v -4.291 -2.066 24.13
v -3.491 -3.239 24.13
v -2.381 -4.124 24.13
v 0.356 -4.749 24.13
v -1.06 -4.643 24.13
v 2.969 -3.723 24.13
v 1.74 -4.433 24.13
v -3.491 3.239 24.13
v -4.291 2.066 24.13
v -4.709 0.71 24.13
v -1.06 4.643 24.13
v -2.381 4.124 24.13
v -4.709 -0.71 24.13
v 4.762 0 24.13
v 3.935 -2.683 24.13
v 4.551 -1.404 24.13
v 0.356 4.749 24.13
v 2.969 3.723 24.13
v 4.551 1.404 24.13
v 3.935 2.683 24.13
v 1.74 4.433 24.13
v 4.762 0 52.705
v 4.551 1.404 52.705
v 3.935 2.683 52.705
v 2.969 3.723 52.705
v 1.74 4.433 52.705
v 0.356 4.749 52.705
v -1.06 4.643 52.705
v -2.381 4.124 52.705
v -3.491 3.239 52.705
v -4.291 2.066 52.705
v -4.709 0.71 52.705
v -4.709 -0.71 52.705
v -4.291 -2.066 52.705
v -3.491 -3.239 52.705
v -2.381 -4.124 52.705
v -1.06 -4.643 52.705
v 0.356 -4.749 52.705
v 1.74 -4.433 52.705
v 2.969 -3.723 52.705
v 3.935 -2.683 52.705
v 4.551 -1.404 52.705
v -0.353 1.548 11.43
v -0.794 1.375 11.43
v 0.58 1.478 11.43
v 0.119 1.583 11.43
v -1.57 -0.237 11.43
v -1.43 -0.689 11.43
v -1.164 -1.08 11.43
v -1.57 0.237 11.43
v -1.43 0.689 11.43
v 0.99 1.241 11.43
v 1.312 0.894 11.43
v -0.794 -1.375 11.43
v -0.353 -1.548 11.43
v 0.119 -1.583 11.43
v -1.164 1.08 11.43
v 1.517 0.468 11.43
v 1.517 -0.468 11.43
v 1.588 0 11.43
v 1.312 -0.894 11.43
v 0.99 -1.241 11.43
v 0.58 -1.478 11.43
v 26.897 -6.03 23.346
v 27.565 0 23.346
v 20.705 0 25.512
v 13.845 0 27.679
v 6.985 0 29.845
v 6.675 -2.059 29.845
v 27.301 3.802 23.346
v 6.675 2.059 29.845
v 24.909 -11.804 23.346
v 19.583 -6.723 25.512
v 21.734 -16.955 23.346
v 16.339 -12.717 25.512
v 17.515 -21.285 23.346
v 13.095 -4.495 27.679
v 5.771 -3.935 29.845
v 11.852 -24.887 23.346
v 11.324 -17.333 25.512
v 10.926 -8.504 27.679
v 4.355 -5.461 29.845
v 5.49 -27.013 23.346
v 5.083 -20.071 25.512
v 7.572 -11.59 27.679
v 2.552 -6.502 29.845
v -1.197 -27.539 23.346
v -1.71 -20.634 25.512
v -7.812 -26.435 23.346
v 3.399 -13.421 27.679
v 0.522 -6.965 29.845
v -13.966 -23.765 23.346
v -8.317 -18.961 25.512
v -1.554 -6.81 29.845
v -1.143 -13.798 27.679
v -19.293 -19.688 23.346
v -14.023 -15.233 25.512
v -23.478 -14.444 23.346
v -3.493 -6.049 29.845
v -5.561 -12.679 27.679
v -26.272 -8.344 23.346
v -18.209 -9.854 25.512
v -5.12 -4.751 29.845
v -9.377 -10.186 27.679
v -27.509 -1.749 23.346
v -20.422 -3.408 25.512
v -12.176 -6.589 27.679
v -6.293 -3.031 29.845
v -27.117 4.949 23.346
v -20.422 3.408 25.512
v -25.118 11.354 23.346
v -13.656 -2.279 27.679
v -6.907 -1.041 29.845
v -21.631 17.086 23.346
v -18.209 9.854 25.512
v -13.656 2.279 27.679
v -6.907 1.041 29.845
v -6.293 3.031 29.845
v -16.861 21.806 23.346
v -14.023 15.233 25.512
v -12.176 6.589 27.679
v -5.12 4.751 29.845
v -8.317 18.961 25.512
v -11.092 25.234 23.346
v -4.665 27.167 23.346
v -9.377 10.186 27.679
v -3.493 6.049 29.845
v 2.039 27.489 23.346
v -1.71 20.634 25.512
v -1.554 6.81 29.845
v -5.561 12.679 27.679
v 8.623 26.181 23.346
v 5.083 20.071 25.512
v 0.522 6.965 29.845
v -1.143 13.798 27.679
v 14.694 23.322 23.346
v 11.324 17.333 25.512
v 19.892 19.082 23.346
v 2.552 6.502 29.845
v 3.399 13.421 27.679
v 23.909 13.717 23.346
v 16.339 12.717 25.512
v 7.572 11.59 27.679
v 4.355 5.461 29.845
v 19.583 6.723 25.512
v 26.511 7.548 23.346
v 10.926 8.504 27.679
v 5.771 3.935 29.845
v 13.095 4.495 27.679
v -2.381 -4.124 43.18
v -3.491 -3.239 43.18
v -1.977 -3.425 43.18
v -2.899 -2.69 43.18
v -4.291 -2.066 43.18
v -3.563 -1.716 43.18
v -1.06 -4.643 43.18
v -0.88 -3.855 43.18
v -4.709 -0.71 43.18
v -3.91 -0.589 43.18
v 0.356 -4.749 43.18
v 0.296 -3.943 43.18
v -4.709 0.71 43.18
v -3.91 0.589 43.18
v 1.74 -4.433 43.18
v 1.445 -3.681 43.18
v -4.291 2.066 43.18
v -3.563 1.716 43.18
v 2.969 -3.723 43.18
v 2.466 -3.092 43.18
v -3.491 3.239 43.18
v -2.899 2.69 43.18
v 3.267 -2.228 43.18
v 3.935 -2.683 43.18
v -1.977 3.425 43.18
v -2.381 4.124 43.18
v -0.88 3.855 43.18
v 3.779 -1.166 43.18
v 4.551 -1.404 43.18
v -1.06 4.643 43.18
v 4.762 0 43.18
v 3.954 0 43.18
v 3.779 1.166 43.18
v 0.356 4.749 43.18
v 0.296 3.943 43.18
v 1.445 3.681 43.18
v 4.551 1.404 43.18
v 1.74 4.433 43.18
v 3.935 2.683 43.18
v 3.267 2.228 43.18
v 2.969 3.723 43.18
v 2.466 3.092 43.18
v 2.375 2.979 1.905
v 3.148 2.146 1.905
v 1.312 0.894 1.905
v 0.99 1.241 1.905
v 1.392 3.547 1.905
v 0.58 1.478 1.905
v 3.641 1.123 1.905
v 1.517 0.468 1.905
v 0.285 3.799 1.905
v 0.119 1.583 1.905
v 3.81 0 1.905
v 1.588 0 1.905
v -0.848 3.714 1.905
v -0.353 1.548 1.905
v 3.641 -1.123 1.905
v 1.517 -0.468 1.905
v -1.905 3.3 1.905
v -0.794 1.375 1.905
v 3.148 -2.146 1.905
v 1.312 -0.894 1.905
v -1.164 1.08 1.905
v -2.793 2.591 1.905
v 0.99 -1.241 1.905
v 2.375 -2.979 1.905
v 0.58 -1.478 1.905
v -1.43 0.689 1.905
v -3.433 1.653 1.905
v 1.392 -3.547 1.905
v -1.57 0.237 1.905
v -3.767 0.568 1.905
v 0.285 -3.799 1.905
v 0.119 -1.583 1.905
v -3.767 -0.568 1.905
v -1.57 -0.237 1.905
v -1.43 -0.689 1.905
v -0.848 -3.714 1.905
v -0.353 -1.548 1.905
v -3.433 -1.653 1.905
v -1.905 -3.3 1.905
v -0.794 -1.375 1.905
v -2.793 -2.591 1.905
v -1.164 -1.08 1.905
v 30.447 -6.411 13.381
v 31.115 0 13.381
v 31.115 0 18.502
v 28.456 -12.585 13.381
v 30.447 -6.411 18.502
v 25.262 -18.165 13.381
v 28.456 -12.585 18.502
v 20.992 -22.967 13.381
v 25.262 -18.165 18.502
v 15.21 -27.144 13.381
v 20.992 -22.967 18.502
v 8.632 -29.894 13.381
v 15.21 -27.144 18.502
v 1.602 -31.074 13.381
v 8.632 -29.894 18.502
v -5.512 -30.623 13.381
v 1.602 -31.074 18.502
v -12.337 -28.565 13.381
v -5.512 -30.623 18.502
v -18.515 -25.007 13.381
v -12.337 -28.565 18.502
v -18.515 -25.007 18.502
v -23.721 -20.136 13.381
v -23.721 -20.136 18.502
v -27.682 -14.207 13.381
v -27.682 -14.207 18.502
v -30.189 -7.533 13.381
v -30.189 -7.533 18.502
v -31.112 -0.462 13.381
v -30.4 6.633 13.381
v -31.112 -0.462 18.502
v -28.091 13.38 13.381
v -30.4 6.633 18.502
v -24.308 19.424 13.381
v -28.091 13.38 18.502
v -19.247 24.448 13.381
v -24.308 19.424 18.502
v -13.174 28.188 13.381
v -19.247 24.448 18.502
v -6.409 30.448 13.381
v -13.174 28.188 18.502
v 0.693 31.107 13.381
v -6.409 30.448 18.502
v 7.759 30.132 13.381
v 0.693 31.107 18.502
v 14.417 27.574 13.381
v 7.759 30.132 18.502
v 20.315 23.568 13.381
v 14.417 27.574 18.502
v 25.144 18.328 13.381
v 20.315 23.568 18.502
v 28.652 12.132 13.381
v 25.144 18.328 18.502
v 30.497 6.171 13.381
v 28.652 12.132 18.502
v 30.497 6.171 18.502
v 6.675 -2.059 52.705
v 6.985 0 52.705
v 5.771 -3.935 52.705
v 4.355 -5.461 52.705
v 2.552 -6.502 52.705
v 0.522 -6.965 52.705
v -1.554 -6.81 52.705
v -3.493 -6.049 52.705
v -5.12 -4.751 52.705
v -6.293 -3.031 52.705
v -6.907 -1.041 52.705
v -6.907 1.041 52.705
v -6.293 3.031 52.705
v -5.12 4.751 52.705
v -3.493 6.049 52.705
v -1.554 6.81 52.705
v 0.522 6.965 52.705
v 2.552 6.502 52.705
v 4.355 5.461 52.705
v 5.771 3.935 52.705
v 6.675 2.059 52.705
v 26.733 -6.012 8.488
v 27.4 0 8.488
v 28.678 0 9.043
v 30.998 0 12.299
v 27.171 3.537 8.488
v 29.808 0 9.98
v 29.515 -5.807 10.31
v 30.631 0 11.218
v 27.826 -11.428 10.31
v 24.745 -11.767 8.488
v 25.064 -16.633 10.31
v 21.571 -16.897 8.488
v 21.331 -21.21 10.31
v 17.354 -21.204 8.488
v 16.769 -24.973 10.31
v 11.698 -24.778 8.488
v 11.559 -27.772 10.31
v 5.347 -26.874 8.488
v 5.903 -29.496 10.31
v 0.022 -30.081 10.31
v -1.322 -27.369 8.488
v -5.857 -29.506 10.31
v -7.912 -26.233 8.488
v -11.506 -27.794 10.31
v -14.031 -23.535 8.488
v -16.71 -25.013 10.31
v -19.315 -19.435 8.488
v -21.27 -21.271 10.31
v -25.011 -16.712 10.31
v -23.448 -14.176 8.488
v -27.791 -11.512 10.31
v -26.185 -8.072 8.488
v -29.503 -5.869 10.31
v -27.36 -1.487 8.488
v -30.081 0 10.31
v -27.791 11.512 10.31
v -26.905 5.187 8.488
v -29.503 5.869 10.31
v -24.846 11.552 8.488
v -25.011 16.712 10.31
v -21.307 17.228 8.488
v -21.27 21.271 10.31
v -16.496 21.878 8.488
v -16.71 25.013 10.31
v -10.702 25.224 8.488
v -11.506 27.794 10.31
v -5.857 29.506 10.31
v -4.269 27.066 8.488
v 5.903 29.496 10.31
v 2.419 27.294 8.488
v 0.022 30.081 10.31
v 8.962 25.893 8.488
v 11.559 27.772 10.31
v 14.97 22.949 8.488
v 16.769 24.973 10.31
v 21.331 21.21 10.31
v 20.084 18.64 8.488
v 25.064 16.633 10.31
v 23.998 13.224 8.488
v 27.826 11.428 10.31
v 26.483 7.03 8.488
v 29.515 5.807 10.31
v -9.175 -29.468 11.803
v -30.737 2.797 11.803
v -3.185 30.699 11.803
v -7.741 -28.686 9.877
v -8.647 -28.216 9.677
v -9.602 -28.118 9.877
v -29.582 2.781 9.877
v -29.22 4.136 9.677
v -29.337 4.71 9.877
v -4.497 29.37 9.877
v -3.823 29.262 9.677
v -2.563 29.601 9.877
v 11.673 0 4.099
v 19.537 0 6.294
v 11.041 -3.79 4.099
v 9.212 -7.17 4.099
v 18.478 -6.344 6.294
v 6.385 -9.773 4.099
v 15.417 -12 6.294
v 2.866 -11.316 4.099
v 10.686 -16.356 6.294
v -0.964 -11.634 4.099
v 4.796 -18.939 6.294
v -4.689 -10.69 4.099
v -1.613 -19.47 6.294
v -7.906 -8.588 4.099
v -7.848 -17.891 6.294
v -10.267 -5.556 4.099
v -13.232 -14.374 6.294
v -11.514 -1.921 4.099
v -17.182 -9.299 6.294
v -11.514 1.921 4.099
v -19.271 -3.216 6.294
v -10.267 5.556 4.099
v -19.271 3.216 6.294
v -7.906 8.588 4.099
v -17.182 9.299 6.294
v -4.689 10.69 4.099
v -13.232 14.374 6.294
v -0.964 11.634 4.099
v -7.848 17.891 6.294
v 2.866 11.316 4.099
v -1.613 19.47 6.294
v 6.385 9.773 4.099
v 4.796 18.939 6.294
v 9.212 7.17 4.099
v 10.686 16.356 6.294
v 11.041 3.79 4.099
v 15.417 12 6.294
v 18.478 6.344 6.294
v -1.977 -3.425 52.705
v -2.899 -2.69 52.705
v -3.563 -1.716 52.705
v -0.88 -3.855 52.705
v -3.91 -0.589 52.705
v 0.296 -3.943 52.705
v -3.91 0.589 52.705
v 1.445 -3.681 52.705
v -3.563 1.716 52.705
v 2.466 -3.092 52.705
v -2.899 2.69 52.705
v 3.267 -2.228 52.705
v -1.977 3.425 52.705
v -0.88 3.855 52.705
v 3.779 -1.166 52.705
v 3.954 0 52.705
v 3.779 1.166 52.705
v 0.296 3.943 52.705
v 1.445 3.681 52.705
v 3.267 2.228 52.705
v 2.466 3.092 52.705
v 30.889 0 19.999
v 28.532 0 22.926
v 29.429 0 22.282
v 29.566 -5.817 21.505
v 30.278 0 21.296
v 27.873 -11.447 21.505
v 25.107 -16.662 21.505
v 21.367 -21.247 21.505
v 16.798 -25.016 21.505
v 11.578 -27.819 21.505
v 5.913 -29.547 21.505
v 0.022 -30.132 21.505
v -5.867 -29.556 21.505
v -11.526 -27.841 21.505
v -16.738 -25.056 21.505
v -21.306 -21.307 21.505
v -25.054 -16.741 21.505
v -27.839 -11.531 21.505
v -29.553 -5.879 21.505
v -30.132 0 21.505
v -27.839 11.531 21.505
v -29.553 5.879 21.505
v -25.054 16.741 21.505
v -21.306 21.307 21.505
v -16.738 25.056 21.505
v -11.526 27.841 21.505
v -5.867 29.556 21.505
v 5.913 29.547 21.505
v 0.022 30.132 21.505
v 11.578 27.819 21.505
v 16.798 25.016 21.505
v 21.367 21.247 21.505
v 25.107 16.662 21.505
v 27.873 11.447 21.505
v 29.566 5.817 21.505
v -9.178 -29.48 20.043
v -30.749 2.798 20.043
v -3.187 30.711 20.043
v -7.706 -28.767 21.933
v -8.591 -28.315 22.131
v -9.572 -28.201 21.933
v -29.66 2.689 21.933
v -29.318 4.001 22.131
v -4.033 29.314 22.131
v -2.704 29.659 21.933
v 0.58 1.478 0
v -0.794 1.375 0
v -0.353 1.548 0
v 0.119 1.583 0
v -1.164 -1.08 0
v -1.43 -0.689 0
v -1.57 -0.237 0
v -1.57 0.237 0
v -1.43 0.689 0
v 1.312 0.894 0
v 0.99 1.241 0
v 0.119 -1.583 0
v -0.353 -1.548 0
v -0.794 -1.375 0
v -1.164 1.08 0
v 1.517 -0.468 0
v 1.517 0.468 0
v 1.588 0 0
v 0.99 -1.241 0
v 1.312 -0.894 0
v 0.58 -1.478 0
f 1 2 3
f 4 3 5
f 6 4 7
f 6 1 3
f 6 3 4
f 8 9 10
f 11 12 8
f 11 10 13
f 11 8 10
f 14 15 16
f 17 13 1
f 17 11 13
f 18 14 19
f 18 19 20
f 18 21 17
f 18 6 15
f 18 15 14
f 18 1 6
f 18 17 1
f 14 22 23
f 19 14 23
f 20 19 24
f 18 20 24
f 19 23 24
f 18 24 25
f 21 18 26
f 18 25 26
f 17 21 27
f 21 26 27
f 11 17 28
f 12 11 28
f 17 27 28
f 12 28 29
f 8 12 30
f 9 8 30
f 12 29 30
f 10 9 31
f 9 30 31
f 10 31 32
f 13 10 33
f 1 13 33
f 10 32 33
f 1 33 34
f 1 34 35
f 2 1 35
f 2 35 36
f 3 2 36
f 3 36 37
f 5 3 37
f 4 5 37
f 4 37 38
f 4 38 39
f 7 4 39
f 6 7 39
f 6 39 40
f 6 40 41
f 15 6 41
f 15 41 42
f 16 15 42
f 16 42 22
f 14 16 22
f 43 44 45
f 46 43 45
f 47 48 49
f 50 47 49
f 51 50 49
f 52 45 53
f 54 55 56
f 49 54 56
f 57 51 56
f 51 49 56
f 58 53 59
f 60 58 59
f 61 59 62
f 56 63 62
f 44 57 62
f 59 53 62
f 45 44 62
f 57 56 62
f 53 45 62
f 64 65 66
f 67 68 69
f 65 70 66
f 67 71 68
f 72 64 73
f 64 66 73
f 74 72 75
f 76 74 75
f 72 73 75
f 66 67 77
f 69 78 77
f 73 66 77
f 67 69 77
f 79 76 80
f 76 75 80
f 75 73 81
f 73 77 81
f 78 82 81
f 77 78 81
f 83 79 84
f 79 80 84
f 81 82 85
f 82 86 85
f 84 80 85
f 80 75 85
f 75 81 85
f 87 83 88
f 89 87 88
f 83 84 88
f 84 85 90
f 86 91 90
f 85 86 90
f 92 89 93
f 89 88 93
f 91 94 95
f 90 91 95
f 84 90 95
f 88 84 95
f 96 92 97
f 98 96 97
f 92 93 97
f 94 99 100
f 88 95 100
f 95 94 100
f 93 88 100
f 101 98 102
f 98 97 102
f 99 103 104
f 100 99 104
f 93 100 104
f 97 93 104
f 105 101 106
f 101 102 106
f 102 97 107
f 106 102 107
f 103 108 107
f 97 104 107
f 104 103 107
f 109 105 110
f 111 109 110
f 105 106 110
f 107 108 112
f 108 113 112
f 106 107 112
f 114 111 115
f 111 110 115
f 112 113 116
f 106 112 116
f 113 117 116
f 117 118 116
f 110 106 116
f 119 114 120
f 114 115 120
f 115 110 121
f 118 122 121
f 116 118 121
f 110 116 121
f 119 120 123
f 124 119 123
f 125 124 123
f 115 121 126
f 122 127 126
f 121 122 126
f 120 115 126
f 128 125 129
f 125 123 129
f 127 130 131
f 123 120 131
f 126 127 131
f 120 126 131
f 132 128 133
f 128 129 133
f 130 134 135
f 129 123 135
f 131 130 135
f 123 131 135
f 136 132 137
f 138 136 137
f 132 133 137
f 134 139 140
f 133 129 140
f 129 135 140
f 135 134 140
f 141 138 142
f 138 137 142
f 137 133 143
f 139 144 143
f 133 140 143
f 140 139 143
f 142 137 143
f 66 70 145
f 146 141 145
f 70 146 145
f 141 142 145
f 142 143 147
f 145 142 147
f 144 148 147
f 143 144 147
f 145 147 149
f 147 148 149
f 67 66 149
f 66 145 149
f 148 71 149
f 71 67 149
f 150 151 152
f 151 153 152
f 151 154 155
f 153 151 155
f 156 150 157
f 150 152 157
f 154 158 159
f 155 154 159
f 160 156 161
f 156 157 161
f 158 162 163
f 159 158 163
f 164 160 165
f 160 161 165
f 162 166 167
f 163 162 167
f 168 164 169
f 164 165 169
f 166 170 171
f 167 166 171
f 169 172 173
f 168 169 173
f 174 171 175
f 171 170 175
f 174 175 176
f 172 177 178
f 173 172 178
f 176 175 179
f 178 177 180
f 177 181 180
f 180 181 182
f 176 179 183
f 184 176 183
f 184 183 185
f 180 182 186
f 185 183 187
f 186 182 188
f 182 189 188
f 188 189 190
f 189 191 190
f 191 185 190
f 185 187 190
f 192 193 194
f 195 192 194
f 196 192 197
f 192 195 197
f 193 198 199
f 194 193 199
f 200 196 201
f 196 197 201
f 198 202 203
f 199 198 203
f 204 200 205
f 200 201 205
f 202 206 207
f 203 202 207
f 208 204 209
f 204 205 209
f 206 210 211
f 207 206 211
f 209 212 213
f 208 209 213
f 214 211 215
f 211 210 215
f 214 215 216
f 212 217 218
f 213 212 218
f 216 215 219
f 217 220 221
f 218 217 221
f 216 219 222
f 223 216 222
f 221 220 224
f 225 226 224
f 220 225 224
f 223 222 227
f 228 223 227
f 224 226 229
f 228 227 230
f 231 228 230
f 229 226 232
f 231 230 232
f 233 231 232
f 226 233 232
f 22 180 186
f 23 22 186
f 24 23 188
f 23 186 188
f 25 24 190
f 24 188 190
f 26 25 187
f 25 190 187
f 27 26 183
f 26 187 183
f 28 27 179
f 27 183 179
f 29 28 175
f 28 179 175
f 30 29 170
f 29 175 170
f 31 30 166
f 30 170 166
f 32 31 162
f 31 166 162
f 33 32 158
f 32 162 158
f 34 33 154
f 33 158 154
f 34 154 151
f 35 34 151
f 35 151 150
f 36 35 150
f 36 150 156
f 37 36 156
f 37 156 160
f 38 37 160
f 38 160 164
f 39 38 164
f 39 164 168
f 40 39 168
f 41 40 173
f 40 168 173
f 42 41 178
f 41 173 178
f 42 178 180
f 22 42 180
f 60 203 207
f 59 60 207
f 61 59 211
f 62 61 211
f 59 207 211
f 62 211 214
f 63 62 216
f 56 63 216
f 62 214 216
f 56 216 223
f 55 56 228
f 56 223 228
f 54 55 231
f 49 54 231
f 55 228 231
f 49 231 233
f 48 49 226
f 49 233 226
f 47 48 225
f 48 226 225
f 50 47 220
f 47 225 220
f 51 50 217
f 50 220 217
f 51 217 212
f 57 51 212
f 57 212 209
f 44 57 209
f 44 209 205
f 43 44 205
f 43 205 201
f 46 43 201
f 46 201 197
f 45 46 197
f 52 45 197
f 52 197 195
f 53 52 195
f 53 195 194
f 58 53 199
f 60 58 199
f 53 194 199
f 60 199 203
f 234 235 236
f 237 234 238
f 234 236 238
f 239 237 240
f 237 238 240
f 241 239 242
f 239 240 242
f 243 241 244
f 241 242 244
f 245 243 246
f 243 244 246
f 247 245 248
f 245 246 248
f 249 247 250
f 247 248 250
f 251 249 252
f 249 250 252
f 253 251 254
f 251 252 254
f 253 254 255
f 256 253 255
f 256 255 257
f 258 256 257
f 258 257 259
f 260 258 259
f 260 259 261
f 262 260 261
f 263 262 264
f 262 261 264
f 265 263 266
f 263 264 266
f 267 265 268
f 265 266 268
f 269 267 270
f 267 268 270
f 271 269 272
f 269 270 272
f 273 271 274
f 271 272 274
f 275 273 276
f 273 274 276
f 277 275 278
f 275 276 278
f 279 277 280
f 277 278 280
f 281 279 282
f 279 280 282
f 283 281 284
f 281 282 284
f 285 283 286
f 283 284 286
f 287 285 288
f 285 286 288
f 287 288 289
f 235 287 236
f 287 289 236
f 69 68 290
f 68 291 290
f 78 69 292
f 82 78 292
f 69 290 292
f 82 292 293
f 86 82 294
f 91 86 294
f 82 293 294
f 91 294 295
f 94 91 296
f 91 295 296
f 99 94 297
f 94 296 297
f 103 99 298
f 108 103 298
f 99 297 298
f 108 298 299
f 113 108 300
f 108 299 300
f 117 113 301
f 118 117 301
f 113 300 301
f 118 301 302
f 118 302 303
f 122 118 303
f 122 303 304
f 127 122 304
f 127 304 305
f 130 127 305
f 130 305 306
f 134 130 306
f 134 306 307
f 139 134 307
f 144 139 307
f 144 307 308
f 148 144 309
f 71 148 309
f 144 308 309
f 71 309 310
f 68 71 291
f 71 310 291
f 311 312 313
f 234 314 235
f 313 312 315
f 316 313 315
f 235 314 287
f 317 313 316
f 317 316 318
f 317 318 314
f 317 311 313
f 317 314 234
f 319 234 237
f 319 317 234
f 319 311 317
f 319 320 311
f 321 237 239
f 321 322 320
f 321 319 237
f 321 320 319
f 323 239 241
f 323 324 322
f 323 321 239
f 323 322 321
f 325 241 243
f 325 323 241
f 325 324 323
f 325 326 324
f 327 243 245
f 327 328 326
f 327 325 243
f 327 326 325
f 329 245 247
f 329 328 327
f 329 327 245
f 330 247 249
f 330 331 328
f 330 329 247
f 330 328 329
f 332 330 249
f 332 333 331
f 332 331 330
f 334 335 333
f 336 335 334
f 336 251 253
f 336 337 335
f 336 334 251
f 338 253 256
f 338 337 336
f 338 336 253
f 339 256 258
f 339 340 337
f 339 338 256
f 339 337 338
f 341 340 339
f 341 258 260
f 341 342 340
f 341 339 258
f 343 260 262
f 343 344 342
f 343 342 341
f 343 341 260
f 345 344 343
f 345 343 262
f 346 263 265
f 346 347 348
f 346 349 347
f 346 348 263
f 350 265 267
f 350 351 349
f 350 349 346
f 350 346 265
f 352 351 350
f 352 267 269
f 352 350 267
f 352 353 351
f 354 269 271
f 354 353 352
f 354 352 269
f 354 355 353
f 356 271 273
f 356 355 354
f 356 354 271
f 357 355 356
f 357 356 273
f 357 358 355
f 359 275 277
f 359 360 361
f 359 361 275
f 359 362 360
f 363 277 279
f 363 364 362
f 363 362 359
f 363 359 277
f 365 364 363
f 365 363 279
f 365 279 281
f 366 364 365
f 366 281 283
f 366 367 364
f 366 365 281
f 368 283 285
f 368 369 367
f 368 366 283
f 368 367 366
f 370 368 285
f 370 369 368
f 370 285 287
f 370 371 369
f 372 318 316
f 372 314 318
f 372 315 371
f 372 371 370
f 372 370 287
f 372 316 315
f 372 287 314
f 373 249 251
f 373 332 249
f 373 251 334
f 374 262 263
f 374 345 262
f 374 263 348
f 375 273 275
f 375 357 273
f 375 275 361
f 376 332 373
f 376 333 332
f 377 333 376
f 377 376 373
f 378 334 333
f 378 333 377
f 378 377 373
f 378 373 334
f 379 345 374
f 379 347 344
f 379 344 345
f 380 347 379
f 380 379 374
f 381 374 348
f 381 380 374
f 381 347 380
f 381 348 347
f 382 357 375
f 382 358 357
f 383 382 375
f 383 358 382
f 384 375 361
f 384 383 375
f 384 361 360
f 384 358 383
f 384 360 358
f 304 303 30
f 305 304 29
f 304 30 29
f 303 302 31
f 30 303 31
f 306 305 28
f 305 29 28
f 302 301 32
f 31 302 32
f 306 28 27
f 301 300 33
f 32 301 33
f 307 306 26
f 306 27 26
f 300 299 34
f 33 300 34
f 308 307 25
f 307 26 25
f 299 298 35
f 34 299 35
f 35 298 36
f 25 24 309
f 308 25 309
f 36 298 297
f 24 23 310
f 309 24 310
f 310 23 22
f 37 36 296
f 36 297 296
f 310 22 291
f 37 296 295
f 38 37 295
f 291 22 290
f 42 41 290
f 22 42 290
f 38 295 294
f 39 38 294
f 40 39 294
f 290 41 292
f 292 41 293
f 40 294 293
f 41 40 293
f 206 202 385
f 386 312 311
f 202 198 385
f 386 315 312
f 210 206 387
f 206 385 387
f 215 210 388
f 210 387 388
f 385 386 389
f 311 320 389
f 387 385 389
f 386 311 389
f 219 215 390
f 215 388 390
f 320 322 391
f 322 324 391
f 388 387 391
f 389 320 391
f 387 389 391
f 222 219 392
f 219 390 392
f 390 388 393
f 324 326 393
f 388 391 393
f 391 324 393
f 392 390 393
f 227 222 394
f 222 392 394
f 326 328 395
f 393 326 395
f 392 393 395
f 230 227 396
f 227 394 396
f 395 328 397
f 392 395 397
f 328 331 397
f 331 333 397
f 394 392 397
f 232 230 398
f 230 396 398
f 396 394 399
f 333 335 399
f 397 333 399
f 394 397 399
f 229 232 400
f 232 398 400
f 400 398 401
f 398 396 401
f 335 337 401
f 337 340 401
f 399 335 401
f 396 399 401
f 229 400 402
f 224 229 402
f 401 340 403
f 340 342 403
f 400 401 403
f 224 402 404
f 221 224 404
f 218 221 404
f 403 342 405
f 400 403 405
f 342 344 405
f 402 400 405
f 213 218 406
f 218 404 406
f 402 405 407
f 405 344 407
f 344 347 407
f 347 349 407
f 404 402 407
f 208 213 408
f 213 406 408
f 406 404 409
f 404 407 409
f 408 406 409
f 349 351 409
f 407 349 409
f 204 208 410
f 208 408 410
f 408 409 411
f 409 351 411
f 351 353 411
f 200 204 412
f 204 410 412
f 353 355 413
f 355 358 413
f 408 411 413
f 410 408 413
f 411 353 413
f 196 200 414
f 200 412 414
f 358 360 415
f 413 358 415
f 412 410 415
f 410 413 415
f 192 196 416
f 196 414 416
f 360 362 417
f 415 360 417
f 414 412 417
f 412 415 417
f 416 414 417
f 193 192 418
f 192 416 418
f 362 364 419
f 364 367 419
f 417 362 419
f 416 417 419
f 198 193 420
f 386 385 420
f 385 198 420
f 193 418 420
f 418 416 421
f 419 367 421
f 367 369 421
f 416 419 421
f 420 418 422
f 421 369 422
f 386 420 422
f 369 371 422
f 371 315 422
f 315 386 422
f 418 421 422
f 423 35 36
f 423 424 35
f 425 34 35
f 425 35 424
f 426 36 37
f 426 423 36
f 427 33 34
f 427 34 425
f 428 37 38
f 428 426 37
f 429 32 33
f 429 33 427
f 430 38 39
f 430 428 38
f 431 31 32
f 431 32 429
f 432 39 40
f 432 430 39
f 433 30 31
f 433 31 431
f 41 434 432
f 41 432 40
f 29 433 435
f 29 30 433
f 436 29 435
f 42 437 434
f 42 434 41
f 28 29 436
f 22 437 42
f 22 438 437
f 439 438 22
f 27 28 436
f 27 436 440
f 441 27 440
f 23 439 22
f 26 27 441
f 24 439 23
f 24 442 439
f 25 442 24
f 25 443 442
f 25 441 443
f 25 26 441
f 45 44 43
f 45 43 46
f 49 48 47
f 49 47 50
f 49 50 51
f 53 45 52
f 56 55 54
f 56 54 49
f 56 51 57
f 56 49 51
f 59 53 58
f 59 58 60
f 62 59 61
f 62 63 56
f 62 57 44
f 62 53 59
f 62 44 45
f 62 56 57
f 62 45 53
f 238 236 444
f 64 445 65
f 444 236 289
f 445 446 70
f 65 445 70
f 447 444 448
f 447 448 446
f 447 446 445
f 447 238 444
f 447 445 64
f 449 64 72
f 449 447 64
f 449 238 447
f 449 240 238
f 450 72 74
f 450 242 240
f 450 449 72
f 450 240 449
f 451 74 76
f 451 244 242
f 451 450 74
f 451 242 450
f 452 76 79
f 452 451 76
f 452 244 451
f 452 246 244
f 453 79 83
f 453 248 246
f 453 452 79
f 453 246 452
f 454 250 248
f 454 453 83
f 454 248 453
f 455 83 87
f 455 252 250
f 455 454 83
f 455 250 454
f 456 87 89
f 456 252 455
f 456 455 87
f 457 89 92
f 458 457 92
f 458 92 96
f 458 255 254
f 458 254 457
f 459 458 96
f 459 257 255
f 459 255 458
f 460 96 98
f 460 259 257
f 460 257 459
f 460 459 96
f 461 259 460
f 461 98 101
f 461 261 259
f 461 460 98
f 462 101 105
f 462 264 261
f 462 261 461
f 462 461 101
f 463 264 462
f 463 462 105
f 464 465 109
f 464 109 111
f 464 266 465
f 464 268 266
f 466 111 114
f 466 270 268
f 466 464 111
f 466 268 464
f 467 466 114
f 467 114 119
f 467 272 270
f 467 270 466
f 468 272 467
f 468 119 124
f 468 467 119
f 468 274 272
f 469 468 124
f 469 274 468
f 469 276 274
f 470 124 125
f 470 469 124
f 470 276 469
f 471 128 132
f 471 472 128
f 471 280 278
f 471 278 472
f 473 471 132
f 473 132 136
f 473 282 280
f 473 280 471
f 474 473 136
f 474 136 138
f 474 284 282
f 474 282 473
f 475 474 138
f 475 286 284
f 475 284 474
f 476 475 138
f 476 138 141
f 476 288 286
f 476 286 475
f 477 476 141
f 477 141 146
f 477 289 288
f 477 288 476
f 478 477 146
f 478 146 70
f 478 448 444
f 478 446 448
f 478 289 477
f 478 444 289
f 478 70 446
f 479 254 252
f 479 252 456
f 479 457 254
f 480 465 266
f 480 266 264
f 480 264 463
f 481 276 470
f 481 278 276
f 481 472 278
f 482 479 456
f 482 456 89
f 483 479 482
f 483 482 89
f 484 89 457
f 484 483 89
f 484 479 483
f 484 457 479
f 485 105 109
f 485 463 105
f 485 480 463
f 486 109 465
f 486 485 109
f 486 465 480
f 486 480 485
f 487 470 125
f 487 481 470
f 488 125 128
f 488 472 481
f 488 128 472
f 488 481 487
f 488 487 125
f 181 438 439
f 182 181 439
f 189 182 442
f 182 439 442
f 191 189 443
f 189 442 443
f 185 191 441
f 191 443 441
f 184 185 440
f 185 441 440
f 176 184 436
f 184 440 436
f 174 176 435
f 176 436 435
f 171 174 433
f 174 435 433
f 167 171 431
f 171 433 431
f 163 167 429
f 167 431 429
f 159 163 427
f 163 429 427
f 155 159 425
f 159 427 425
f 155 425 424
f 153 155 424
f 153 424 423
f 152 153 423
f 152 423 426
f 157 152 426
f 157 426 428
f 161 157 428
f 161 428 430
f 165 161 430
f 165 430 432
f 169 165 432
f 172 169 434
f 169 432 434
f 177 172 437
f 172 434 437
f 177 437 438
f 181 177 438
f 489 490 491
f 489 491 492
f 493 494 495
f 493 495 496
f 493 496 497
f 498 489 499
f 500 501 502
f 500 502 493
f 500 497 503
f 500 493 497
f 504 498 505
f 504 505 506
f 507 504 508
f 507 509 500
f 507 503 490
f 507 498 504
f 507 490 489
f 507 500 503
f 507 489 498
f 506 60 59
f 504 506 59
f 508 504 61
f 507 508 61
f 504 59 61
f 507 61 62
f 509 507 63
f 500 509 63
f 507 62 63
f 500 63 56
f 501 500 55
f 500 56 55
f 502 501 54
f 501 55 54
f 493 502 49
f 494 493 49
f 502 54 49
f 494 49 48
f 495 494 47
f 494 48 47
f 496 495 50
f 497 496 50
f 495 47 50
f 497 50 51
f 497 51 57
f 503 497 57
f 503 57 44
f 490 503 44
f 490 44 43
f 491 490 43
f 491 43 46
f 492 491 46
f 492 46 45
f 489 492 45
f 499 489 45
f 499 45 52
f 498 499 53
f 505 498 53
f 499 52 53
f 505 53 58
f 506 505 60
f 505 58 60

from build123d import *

# Parameters (mm, degrees)
F2_R      = 4.7625
F3_DEPTH  = 9.525
F4_R      = 1.5875
F5_DEPTH  = 9.525
F6_R      = 5.08
F3_FACE_R = 4.7625
F7_DEPTH  = 9.525
F8_R      = 3.954416
F9_DEPTH  = 9.525
F5_FACE_R = 1.5875
F10_DEPTH = 11.43
F11_DEPTH = 19.05


with BuildPart() as f1:
    # F0 (on Front) → F1 (revolve)
    with BuildSketch(Plane.XZ):
        Polygon((3.81, 1.905), (31.115, 9.525), (31.115, 22.225), (6.985, 29.845), (6.985, 52.705), (0, 52.705), (0, 1.905), align=None)
    revolve(axis=Axis((0, 0, 27.305), (0, 0, -1)))

    # F2 (on face) → F3 (cut)
    with BuildSketch(Plane.XY.offset(52.705)):
        Circle(F2_R)
    extrude(amount=-F3_DEPTH, mode=Mode.SUBTRACT)

    # F4 (on face) → F5 (cut)
    with BuildSketch(Plane(origin=(0, 0, 1.905), x_dir=(1, 0, 0), z_dir=(0, 0, -1))):
        Circle(F4_R)
    extrude(amount=-F5_DEPTH, mode=Mode.SUBTRACT)

    # F6
    f6_edges = [f1.edges().sort_by_distance(p)[0] for p in [
        (-31.115, 0, 9.525),
        (-31.115, 0, 22.225),
        (31.115, 0, 15.875),
    ]]
    fillet(f6_edges, radius=F6_R)

    # F3_face (on face) → F11 (cut)
    with BuildSketch(Plane.XY.offset(43.18)):
        Circle(F3_FACE_R)
    extrude(amount=-F11_DEPTH, mode=Mode.SUBTRACT)


with BuildPart() as f7:
    # F3_face (on face) → F7 (new body)
    with BuildSketch(Plane.XY.offset(43.18)):
        Circle(F3_FACE_R)
    extrude(amount=F7_DEPTH)

    # F8 (on face) → F9 (cut)
    with BuildSketch(Plane.XY.offset(52.705)):
        Circle(F8_R)
    extrude(amount=-F9_DEPTH, mode=Mode.SUBTRACT)


with BuildPart() as f10:
    # F5_face (on face) → F10 (new body)
    with BuildSketch(Plane(origin=(0, 0, 11.43), x_dir=(1, 0, 0), z_dir=(0, 0, -1))):
        Circle(F5_FACE_R)
    extrude(amount=F10_DEPTH)


solid = Compound([f1.part, f7.part, f10.part])
